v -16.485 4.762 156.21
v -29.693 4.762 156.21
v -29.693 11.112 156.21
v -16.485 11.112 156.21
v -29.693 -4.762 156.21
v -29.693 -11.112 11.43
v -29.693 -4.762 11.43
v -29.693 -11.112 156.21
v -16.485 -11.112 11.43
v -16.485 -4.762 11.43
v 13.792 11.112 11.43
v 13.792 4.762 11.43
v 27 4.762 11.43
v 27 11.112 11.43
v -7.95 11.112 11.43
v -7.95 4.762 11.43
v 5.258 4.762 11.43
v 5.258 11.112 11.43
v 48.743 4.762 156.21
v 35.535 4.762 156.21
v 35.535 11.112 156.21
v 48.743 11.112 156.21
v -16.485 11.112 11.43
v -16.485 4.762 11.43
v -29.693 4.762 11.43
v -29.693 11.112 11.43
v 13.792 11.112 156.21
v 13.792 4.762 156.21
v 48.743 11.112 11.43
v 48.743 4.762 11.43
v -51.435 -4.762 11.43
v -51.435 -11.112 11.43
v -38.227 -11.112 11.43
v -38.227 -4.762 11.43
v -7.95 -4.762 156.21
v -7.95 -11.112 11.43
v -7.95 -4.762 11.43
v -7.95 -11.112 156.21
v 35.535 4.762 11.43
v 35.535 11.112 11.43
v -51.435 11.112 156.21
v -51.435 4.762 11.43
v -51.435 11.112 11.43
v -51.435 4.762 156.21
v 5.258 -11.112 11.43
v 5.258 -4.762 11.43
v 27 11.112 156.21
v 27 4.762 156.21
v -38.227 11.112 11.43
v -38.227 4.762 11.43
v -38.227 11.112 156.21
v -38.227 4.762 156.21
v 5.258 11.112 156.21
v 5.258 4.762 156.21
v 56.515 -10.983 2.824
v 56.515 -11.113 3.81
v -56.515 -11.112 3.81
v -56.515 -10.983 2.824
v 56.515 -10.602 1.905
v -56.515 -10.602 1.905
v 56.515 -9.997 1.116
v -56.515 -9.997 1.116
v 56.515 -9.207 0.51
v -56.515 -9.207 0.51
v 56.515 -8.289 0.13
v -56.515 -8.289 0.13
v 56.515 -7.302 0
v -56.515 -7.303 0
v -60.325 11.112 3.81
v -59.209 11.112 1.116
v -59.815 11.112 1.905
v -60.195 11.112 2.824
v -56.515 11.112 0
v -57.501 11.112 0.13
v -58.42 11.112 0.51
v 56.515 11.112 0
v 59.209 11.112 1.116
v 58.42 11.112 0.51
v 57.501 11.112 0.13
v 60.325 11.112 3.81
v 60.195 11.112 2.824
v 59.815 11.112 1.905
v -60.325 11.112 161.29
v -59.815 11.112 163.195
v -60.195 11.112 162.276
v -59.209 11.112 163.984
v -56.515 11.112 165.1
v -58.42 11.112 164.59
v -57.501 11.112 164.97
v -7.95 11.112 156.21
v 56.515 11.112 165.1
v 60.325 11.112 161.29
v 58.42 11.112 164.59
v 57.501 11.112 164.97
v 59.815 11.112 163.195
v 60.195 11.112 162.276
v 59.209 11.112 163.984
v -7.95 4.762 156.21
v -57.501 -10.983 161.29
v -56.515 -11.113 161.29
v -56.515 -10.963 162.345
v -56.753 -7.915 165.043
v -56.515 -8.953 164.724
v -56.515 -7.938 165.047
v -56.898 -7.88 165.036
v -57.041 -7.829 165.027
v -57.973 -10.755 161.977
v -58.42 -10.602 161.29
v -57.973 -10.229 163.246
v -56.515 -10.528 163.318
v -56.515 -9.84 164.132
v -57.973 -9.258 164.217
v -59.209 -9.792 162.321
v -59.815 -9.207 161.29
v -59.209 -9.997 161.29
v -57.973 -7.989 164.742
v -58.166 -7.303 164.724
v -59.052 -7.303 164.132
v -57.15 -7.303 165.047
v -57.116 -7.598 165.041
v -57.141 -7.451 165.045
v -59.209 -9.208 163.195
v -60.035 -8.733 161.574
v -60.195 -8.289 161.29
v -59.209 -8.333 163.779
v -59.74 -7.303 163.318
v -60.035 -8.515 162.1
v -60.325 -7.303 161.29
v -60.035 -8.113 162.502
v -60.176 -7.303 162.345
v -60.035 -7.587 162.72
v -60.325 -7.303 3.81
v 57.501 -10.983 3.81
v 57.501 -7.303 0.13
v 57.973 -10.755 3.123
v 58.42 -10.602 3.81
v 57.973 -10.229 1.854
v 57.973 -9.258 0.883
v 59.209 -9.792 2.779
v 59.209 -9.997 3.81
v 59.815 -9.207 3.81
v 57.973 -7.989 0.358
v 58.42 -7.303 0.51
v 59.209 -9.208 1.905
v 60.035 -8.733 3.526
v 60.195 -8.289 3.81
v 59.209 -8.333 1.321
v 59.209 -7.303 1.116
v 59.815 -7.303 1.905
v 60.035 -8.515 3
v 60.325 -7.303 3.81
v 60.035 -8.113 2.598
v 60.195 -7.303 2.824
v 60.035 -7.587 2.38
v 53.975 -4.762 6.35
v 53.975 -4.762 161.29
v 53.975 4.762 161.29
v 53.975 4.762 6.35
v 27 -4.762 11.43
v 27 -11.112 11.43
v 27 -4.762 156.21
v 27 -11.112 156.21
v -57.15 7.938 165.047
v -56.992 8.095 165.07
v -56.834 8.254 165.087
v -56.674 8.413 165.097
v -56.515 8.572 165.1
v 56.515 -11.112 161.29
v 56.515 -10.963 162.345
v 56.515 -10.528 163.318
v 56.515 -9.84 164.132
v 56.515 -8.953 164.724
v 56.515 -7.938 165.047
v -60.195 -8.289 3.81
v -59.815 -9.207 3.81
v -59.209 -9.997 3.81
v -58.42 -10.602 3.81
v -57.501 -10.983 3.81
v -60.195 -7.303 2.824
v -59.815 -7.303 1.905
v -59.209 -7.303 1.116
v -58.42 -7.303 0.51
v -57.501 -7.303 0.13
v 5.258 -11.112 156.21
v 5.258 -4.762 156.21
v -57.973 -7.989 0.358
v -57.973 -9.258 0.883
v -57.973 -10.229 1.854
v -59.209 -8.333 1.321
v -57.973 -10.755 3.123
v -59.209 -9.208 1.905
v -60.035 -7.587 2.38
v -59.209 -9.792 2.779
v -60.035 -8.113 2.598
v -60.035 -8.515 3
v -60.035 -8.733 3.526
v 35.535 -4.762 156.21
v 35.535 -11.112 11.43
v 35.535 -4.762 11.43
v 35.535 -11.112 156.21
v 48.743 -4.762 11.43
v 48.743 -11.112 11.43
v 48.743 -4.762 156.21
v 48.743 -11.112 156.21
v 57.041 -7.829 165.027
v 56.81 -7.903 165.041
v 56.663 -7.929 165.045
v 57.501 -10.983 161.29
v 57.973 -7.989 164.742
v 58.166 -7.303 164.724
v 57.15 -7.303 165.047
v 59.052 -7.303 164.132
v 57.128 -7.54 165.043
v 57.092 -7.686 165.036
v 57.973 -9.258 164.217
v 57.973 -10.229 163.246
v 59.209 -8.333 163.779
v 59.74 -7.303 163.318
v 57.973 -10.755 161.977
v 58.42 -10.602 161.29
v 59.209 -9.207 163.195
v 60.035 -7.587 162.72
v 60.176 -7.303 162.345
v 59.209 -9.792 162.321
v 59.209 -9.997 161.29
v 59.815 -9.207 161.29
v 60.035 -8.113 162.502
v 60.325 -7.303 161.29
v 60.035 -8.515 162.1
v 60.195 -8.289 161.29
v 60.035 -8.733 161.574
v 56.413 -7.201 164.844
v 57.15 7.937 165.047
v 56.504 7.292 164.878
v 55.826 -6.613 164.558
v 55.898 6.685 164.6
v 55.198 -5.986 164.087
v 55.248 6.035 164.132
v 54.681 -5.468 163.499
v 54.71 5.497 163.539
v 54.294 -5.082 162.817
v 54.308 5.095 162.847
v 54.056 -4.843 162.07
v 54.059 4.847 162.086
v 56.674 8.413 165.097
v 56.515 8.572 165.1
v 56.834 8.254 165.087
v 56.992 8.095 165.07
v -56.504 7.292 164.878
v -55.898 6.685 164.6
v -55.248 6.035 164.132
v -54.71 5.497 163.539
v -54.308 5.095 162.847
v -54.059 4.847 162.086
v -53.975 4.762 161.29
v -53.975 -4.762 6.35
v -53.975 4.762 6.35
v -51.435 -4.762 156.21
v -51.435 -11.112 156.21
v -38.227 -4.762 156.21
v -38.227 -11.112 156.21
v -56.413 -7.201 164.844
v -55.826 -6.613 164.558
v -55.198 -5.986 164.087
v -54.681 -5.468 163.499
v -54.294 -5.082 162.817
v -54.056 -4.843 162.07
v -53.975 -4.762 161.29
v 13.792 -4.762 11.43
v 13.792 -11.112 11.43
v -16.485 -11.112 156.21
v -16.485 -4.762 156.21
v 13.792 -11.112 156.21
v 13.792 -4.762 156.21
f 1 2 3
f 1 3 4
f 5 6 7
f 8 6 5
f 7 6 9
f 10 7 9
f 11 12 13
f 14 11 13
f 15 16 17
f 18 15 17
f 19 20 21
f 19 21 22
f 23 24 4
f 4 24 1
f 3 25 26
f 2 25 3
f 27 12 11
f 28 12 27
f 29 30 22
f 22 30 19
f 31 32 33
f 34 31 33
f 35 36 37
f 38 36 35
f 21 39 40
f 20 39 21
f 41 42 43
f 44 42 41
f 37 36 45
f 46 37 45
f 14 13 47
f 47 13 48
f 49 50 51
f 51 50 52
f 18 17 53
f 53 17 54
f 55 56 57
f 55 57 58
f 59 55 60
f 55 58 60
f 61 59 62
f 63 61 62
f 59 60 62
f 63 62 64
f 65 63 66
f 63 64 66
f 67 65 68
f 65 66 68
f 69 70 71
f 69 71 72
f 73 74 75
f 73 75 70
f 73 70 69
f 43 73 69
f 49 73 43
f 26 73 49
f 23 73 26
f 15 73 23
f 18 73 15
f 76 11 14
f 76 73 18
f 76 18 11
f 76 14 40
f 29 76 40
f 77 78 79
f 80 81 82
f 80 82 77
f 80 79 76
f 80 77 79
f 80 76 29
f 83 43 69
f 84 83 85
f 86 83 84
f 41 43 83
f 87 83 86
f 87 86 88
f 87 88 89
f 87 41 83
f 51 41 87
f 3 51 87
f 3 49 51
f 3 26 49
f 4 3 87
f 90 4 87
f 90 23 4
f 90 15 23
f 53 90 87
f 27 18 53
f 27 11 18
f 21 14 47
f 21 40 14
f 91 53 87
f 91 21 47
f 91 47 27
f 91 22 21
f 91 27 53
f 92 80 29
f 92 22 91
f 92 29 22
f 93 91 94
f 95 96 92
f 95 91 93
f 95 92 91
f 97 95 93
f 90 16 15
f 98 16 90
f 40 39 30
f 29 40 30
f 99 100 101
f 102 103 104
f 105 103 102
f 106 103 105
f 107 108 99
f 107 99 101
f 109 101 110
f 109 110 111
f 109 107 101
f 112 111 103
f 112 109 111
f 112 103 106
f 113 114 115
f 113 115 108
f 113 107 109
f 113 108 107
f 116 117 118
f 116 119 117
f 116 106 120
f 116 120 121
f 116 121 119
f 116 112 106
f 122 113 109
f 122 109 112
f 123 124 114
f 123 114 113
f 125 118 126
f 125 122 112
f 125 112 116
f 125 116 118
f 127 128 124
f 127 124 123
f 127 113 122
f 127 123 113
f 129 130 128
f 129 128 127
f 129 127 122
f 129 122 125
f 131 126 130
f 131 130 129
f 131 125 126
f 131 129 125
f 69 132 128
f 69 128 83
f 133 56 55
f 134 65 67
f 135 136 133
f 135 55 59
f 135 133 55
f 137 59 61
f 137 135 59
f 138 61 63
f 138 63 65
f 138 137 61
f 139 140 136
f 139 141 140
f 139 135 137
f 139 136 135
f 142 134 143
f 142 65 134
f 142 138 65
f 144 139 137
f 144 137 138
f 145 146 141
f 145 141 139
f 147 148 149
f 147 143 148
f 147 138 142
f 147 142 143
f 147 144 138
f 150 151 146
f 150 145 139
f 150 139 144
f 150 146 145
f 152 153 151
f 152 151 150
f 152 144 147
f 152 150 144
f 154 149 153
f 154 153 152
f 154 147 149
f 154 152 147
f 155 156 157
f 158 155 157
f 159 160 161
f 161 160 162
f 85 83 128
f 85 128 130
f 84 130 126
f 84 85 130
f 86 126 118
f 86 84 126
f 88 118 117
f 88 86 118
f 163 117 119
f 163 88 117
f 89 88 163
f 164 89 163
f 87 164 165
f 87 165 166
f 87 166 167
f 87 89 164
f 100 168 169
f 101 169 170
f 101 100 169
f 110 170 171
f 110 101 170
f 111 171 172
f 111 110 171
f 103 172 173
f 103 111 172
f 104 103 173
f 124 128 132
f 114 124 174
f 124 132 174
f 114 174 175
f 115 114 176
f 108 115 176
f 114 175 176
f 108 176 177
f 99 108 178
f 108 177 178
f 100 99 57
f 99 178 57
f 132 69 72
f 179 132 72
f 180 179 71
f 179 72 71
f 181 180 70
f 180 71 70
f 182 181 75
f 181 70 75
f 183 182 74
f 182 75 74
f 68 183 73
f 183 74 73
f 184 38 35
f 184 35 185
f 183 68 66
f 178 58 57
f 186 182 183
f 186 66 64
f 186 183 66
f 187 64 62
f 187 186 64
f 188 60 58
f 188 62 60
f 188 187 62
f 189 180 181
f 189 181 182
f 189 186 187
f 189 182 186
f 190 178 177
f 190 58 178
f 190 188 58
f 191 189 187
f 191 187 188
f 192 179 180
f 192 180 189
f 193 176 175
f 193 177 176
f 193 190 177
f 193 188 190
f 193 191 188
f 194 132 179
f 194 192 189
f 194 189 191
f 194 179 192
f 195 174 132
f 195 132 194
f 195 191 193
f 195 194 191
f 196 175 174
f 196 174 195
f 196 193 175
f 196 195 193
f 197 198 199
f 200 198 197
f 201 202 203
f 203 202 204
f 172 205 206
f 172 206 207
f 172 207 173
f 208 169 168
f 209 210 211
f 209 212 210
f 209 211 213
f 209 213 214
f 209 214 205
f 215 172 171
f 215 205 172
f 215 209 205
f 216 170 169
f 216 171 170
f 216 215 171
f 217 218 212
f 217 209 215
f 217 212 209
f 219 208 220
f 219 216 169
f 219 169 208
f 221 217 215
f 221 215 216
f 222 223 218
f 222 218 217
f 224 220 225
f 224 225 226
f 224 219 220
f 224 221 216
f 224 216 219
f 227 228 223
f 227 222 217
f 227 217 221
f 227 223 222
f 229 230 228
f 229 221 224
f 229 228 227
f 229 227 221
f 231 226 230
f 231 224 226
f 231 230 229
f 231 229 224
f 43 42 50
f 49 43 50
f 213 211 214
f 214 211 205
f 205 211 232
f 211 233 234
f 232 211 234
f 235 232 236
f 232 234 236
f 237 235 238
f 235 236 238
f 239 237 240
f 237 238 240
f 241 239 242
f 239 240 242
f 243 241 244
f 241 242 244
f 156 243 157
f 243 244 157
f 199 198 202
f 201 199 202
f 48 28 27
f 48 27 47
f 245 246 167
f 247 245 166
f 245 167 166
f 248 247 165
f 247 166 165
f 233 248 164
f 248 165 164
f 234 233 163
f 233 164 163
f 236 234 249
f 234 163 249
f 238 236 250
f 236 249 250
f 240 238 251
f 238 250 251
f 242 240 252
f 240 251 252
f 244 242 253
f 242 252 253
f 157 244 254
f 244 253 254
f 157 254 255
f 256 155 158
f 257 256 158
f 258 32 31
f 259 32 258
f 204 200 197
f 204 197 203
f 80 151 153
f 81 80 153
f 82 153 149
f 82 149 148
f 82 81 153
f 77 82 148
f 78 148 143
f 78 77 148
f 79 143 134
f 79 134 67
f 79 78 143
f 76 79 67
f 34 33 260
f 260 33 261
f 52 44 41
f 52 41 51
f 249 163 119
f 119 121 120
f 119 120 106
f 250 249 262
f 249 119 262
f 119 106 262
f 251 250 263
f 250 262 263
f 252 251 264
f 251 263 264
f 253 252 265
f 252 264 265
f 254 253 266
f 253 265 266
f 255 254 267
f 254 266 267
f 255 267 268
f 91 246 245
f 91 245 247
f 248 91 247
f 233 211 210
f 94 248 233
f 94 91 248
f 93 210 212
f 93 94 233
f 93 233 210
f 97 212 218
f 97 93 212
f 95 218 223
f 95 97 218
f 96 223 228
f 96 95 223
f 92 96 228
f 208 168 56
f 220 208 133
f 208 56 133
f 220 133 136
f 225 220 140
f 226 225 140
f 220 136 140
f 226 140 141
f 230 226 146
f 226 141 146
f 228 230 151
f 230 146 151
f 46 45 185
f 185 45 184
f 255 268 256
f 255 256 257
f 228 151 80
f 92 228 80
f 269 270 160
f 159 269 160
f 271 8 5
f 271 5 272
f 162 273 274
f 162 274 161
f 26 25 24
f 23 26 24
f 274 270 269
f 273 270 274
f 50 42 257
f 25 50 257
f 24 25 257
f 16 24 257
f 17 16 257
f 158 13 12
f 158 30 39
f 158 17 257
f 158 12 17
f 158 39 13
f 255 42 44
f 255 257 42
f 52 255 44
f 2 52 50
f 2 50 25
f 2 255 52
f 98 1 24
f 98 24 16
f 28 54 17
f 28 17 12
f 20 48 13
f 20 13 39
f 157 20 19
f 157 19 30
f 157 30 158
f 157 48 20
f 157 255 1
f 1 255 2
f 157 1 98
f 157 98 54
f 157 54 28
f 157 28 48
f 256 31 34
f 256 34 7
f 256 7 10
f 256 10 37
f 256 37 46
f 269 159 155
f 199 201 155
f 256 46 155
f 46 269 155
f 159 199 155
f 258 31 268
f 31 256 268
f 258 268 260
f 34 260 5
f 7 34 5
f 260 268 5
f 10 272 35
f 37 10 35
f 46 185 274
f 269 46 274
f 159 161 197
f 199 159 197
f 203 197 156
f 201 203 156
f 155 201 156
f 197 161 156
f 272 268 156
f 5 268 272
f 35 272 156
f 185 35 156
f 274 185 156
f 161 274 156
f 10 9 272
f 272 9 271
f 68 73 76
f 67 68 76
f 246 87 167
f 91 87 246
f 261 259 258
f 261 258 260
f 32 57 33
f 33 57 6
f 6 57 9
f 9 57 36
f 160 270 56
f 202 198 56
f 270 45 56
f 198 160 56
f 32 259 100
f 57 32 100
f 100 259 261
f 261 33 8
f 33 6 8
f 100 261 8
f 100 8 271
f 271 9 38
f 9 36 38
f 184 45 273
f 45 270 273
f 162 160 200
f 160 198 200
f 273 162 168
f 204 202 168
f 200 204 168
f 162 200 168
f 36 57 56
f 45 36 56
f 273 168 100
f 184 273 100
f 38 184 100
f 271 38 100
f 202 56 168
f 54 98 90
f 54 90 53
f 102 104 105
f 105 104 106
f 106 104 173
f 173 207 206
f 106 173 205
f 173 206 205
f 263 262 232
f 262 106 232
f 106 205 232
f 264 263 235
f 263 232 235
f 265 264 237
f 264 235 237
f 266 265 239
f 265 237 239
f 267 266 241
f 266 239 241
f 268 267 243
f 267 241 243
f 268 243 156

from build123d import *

# Parameters (mm, degrees)
F0_W         = 120.65
F0_H         = 22.225
F0_W_2       = 107.95
F0_H_2       = 9.525
F1_DEPTH     = 165.1
F2_W         = 22.225
F2_H         = 6.35
F3_DEPTH     = 55.88
F5_T1_DEPTH  = 113.03
F5_T3_DEPTH  = 27.94
F5_T5_DEPTH  = 157.48
F5_T7_DEPTH  = 9.525
F5_T9_DEPTH  = 107.95
F5_S13_W     = 3.81
F5_S13_H     = 3.81
F5_T14_DEPTH = 3.81
F5_S19_W     = 3.81
F5_S19_H     = 3.81
F5_T20_DEPTH = 3.81
F5_S25_W     = 3.81
F5_S25_H     = 3.81
F5_T26_DEPTH = 3.81
F5_S31_W     = 3.81
F5_S31_H     = 3.81
F5_T32_DEPTH = 3.81
F5_T39_DEPTH = 117.475
F5_T43_DEPTH = 19.05
F5_T50_DEPTH = 19.05
F5_T54_DEPTH = 117.475
F5_T61_DEPTH = 19.05
F5_T65_DEPTH = 117.475
F5_T72_DEPTH = 19.05
F5_T76_DEPTH = 117.475
F4_W         = 13.208
F4_H         = 144.78
F6_DEPTH     = 40.64


# Not quite as in the source:
# - a fillet or chamfer that OpenCascade refuses, or shapes differently, is made with other operations: its cross-section is extruded or revolved along the edge and cut away or added
# - a feature names something its author has since deleted; it is built from what else it names


with BuildPart() as f1:
    # F0 (on Top) → F1 (new body)
    with BuildSketch(Plane.XY):
        Rectangle(F0_W, F0_H)
        Rectangle(F0_W_2, F0_H_2, mode=Mode.SUBTRACT)
    extrude(amount=F1_DEPTH)

    # F2 (on Right) → F3 (join, symmetric)
    with BuildSketch(Plane.YZ):
        with Locations((0, 3.175)):
            Rectangle(F2_W, F2_H)
    extrude(amount=F3_DEPTH, both=True)

    # F5: fillet of radius 3.81 on 12 edges, made by hand

    # F5_s2 → F5_t1 (cut)
    with BuildSketch(Plane.YZ.offset(-56.515)):
        with BuildLine():
            ThreePointArc((-11.1125, 161.29), (-9.9965768363, 163.9840768363), (-7.3025, 165.1))
            Line((-7.3025, 165.1), (-11.1125, 165.1))
            Line((-11.1125, 165.1), (-11.1125, 161.29))
        make_face()
        with BuildLine():
            ThreePointArc((-11.1125, 3.81), (-9.9965768363, 1.1159231637), (-7.3025, 0))
            Line((-7.3025, 0), (-11.1125, 0))
            Line((-11.1125, 0), (-11.1125, 3.81))
        make_face()
    extrude(amount=F5_T1_DEPTH, mode=Mode.SUBTRACT)

    # F5_s4 → F5_t3 (cut)
    with BuildSketch(Plane.XZ.offset(-20.6375)):
        with BuildLine():
            ThreePointArc((-60.325, 161.29), (-59.2090768363, 163.9840768363), (-56.515, 165.1))
            Line((-56.515, 165.1), (-60.325, 165.1))
            Line((-60.325, 165.1), (-60.325, 161.29))
        make_face()
        with BuildLine():
            ThreePointArc((56.515, 165.1), (59.2090768363, 163.9840768363), (60.325, 161.29))
            Line((60.325, 161.29), (60.325, 165.1))
            Line((60.325, 165.1), (56.515, 165.1))
        make_face()
        with BuildLine():
            ThreePointArc((60.325, 3.81), (59.2090768363, 1.1159231637), (56.515, 0))
            Line((56.515, 0), (60.325, 0))
            Line((60.325, 0), (60.325, 3.81))
        make_face()
        with BuildLine():
            ThreePointArc((-60.325, 3.81), (-59.2090768363, 1.1159231637), (-56.515, 0))
            Line((-56.515, 0), (-60.325, 0))
            Line((-60.325, 0), (-60.325, 3.81))
        make_face()
    extrude(amount=F5_T3_DEPTH, mode=Mode.SUBTRACT)

    # F5_s6 → F5_t5 (cut)
    with BuildSketch(Plane.XY.offset(3.81)):
        with BuildLine():
            ThreePointArc((56.515, -11.1125), (59.2090768363, -9.9965768363), (60.325, -7.3025))
            Line((60.325, -7.3025), (60.325, -11.1125))
            Line((60.325, -11.1125), (56.515, -11.1125))
        make_face()
        with BuildLine():
            ThreePointArc((-60.325, -7.3025), (-59.2090768363, -9.9965768363), (-56.515, -11.1125))
            Line((-56.515, -11.1125), (-60.325, -11.1125))
            Line((-60.325, -11.1125), (-60.325, -7.3025))
        make_face()
    extrude(amount=F5_T5_DEPTH, mode=Mode.SUBTRACT)

    # F5_s8 → F5_t7 (cut)
    with BuildSketch(Plane.XZ.offset(-4.7625)):
        with BuildLine():
            ThreePointArc((57.785, 165.1), (55.0909231637, 163.9840768363), (53.975, 161.29))
            Line((53.975, 161.29), (53.975, 165.1))
            Line((53.975, 165.1), (57.785, 165.1))
        make_face()
        with BuildLine():
            ThreePointArc((-57.785, 165.1), (-55.0909231637, 163.9840768363), (-53.975, 161.29))
            Line((-53.975, 161.29), (-53.975, 165.1))
            Line((-53.975, 165.1), (-57.785, 165.1))
        make_face()
    extrude(amount=F5_T7_DEPTH, mode=Mode.SUBTRACT)

    # F5_s10 → F5_t9 (cut)
    with BuildSketch(Plane.YZ.offset(-53.975)):
        with BuildLine():
            ThreePointArc((-8.5725, 165.1), (-5.8784231637, 163.9840768363), (-4.7625, 161.29))
            Line((-4.7625, 161.29), (-4.7625, 165.1))
            Line((-4.7625, 165.1), (-8.5725, 165.1))
        make_face()
        with BuildLine():
            ThreePointArc((8.5725, 165.1), (5.8784231637, 163.9840768363), (4.7625, 161.29))
            Line((4.7625, 161.29), (4.7625, 165.1))
            Line((4.7625, 165.1), (8.5725, 165.1))
        make_face()
    extrude(amount=F5_T9_DEPTH, mode=Mode.SUBTRACT)


with BuildPart() as f5_tool12:
    # F5_s13 → F5_t14 (new body)
    with BuildSketch(Plane.YZ.offset(-56.515)):
        with Locations((-9.2075, 163.195)):
            Rectangle(F5_S13_W, F5_S13_H)
    extrude(amount=-F5_T14_DEPTH)

    # F5_s15 → F5_t16 (revolve, cut)
    with BuildSketch(Plane(origin=(-56.515, -7.3025, 161.29), x_dir=(0, 0.7071067812, -0.7071067812), z_dir=(0, 0.7071067812, 0.7071067812))):
        with BuildLine():
            ThreePointArc((0, -3.81), (3.81, 0), (0, 3.81))
            Line((0, 3.81), (0, -3.81))
        make_face()
    revolve(axis=Axis((-56.515, -7.3025, 161.29), (-1, 0, 0)), mode=Mode.SUBTRACT)


with BuildPart() as f1_1:
    add(f1.part)

    # F5_t11: cut F5_tool12
    add(f5_tool12.part, mode=Mode.SUBTRACT)


with BuildPart() as f5_tool18:
    # F5_s19 → F5_t20 (new body)
    with BuildSketch(Plane.YZ.offset(56.515)):
        with Locations((-9.2075, 163.195)):
            Rectangle(F5_S19_W, F5_S19_H)
    extrude(amount=F5_T20_DEPTH)

    # F5_s21 → F5_t22 (revolve, cut)
    with BuildSketch(Plane(origin=(56.515, -7.3025, 161.29), x_dir=(0, 0.7071067812, -0.7071067812), z_dir=(0, -0.7071067812, -0.7071067812))):
        with BuildLine():
            ThreePointArc((0, -3.81), (3.81, 0), (0, 3.81))
            Line((0, 3.81), (0, -3.81))
        make_face()
    revolve(axis=Axis((56.515, -7.3025, 161.29), (1, 0, 0)), mode=Mode.SUBTRACT)


with BuildPart() as f1_2:
    add(f1_1.part)

    # F5_t17: cut F5_tool18
    add(f5_tool18.part, mode=Mode.SUBTRACT)


with BuildPart() as f5_tool24:
    # F5_s25 → F5_t26 (new body)
    with BuildSketch(Plane.YZ.offset(56.515)):
        with Locations((-9.2075, 1.905)):
            Rectangle(F5_S25_W, F5_S25_H)
    extrude(amount=F5_T26_DEPTH)

    # F5_s27 → F5_t28 (revolve, cut)
    with BuildSketch(Plane(origin=(56.515, -7.3025, 3.81), x_dir=(0, 0.7071067812, 0.7071067812), z_dir=(0, 0.7071067812, -0.7071067812))):
        with BuildLine():
            ThreePointArc((0, -3.81), (3.81, 0), (0, 3.81))
            Line((0, 3.81), (0, -3.81))
        make_face()
    revolve(axis=Axis((56.515, -7.3025, 3.81), (1, 0, 0)), mode=Mode.SUBTRACT)


with BuildPart() as f1_3:
    add(f1_2.part)

    # F5_t23: cut F5_tool24
    add(f5_tool24.part, mode=Mode.SUBTRACT)


with BuildPart() as f5_tool30:
    # F5_s31 → F5_t32 (new body)
    with BuildSketch(Plane.YZ.offset(-56.515)):
        with Locations((-9.2075, 1.905)):
            Rectangle(F5_S31_W, F5_S31_H)
    extrude(amount=-F5_T32_DEPTH)

    # F5_s33 → F5_t34 (revolve, cut)
    with BuildSketch(Plane(origin=(-56.515, -7.3025, 3.81), x_dir=(0, 0.7071067812, 0.7071067812), z_dir=(0, -0.7071067812, 0.7071067812))):
        with BuildLine():
            ThreePointArc((0, -3.81), (3.81, 0), (0, 3.81))
            Line((0, 3.81), (0, -3.81))
        make_face()
    revolve(axis=Axis((-56.515, -7.3025, 3.81), (-1, 0, 0)), mode=Mode.SUBTRACT)


with BuildPart() as f1_4:
    add(f1_3.part)

    # F5_t29: cut F5_tool30
    add(f5_tool30.part, mode=Mode.SUBTRACT)


with BuildPart() as f5_tool37:
    # F5_s38 → F5_t39 (new body)
    with BuildSketch(Plane.YZ.offset(-53.975)):
        with BuildLine():
            ThreePointArc((8.5725, 165.1), (5.8784231637, 163.9840768363), (4.7625, 161.29))
            Line((4.7625, 161.29), (4.7625, 165.1))
            Line((4.7625, 165.1), (8.5725, 165.1))
        make_face()
    extrude(amount=F5_T39_DEPTH)

    split(bisect_by=Plane.YZ.offset(53.975), keep=Keep.TOP)


with BuildPart() as f5_tool41:
    # F5_s42 → F5_t43 (new body)
    with BuildSketch(Plane.XZ.offset(-14.2875)):
        with BuildLine():
            ThreePointArc((57.785, 165.1), (55.0909231637, 163.9840768363), (53.975, 161.29))
            Line((53.975, 161.29), (53.975, 165.1))
            Line((53.975, 165.1), (57.785, 165.1))
        make_face()
    extrude(amount=F5_T43_DEPTH)

    split(bisect_by=Plane.XZ.offset(-4.7625), keep=Keep.BOTTOM)


with BuildPart() as f5_tool37_1:
    add(f5_tool37.part)

    # F5_t45: intersect F5_tool41
    add(f5_tool41.part, mode=Mode.INTERSECT)


with BuildPart() as f1_5:
    add(f1_4.part)

    # F5_t35: cut F5_tool37
    add(f5_tool37_1.part, mode=Mode.SUBTRACT)


with BuildPart() as f5_tool48:
    # F5_s49 → F5_t50 (new body)
    with BuildSketch(Plane.XZ.offset(-4.7625)):
        with BuildLine():
            ThreePointArc((57.785, 165.1), (55.0909231637, 163.9840768363), (53.975, 161.29))
            Line((53.975, 161.29), (53.975, 165.1))
            Line((53.975, 165.1), (57.785, 165.1))
        make_face()
    extrude(amount=F5_T50_DEPTH)

    split(bisect_by=Plane.XZ.offset(4.7625), keep=Keep.TOP)


with BuildPart() as f5_tool52:
    # F5_s53 → F5_t54 (new body)
    with BuildSketch(Plane.YZ.offset(63.5)):
        with BuildLine():
            ThreePointArc((-8.5725, 165.1), (-5.8784231637, 163.9840768363), (-4.7625, 161.29))
            Line((-4.7625, 161.29), (-4.7625, 165.1))
            Line((-4.7625, 165.1), (-8.5725, 165.1))
        make_face()
    extrude(amount=-F5_T54_DEPTH)

    split(bisect_by=Plane.YZ.offset(53.975), keep=Keep.TOP)


with BuildPart() as f5_tool48_1:
    add(f5_tool48.part)

    # F5_t56: intersect F5_tool52
    add(f5_tool52.part, mode=Mode.INTERSECT)


with BuildPart() as f1_6:
    add(f1_5.part)

    # F5_t46: cut F5_tool48
    add(f5_tool48_1.part, mode=Mode.SUBTRACT)


with BuildPart() as f5_tool59:
    # F5_s60 → F5_t61 (new body)
    with BuildSketch(Plane.XZ.offset(14.2875)):
        with BuildLine():
            ThreePointArc((-57.785, 165.1), (-55.0909231637, 163.9840768363), (-53.975, 161.29))
            Line((-53.975, 161.29), (-53.975, 165.1))
            Line((-53.975, 165.1), (-57.785, 165.1))
        make_face()
    extrude(amount=-F5_T61_DEPTH)

    split(bisect_by=Plane.XZ.offset(4.7625), keep=Keep.TOP)


with BuildPart() as f5_tool63:
    # F5_s64 → F5_t65 (new body)
    with BuildSketch(Plane.YZ.offset(53.975)):
        with BuildLine():
            ThreePointArc((-8.5725, 165.1), (-5.8784231637, 163.9840768363), (-4.7625, 161.29))
            Line((-4.7625, 161.29), (-4.7625, 165.1))
            Line((-4.7625, 165.1), (-8.5725, 165.1))
        make_face()
    extrude(amount=-F5_T65_DEPTH)

    split(bisect_by=Plane.YZ.offset(-53.975), keep=Keep.BOTTOM)


with BuildPart() as f5_tool59_1:
    add(f5_tool59.part)

    # F5_t67: intersect F5_tool63
    add(f5_tool63.part, mode=Mode.INTERSECT)


with BuildPart() as f1_7:
    add(f1_6.part)

    # F5_t57: cut F5_tool59
    add(f5_tool59_1.part, mode=Mode.SUBTRACT)


with BuildPart() as f5_tool70:
    # F5_s71 → F5_t72 (new body)
    with BuildSketch(Plane.XZ.offset(4.7625)):
        with BuildLine():
            ThreePointArc((-57.785, 165.1), (-55.0909231637, 163.9840768363), (-53.975, 161.29))
            Line((-53.975, 161.29), (-53.975, 165.1))
            Line((-53.975, 165.1), (-57.785, 165.1))
        make_face()
    extrude(amount=-F5_T72_DEPTH)

    split(bisect_by=Plane.XZ.offset(-4.7625), keep=Keep.BOTTOM)


with BuildPart() as f5_tool74:
    # F5_s75 → F5_t76 (new body)
    with BuildSketch(Plane.YZ.offset(-63.5)):
        with BuildLine():
            ThreePointArc((8.5725, 165.1), (5.8784231637, 163.9840768363), (4.7625, 161.29))
            Line((4.7625, 161.29), (4.7625, 165.1))
            Line((4.7625, 165.1), (8.5725, 165.1))
        make_face()
    extrude(amount=F5_T76_DEPTH)

    split(bisect_by=Plane.YZ.offset(-53.975), keep=Keep.BOTTOM)


with BuildPart() as f5_tool70_1:
    add(f5_tool70.part)

    # F5_t78: intersect F5_tool74
    add(f5_tool74.part, mode=Mode.INTERSECT)


with BuildPart() as f1_8:
    add(f1_7.part)

    # F5_t68: cut F5_tool70
    add(f5_tool70_1.part, mode=Mode.SUBTRACT)

    # F4 (on face) → F6 (cut)
    with BuildSketch(Plane.XZ.offset(11.1125)):
        with Locations((-44.831, 83.82)):
            Rectangle(F4_W, F4_H)
        with Locations((-23.0886, 83.82)):
            Rectangle(F4_W, F4_H)
        with Locations((-1.3462, 83.82)):
            Rectangle(F4_W, F4_H)
        with Locations((20.3962, 83.82)):
            Rectangle(F4_W, F4_H)
        with Locations((42.1386, 83.82)):
            Rectangle(F4_W, F4_H)
    extrude(amount=-F6_DEPTH, mode=Mode.SUBTRACT)


solid = f1_8.part
